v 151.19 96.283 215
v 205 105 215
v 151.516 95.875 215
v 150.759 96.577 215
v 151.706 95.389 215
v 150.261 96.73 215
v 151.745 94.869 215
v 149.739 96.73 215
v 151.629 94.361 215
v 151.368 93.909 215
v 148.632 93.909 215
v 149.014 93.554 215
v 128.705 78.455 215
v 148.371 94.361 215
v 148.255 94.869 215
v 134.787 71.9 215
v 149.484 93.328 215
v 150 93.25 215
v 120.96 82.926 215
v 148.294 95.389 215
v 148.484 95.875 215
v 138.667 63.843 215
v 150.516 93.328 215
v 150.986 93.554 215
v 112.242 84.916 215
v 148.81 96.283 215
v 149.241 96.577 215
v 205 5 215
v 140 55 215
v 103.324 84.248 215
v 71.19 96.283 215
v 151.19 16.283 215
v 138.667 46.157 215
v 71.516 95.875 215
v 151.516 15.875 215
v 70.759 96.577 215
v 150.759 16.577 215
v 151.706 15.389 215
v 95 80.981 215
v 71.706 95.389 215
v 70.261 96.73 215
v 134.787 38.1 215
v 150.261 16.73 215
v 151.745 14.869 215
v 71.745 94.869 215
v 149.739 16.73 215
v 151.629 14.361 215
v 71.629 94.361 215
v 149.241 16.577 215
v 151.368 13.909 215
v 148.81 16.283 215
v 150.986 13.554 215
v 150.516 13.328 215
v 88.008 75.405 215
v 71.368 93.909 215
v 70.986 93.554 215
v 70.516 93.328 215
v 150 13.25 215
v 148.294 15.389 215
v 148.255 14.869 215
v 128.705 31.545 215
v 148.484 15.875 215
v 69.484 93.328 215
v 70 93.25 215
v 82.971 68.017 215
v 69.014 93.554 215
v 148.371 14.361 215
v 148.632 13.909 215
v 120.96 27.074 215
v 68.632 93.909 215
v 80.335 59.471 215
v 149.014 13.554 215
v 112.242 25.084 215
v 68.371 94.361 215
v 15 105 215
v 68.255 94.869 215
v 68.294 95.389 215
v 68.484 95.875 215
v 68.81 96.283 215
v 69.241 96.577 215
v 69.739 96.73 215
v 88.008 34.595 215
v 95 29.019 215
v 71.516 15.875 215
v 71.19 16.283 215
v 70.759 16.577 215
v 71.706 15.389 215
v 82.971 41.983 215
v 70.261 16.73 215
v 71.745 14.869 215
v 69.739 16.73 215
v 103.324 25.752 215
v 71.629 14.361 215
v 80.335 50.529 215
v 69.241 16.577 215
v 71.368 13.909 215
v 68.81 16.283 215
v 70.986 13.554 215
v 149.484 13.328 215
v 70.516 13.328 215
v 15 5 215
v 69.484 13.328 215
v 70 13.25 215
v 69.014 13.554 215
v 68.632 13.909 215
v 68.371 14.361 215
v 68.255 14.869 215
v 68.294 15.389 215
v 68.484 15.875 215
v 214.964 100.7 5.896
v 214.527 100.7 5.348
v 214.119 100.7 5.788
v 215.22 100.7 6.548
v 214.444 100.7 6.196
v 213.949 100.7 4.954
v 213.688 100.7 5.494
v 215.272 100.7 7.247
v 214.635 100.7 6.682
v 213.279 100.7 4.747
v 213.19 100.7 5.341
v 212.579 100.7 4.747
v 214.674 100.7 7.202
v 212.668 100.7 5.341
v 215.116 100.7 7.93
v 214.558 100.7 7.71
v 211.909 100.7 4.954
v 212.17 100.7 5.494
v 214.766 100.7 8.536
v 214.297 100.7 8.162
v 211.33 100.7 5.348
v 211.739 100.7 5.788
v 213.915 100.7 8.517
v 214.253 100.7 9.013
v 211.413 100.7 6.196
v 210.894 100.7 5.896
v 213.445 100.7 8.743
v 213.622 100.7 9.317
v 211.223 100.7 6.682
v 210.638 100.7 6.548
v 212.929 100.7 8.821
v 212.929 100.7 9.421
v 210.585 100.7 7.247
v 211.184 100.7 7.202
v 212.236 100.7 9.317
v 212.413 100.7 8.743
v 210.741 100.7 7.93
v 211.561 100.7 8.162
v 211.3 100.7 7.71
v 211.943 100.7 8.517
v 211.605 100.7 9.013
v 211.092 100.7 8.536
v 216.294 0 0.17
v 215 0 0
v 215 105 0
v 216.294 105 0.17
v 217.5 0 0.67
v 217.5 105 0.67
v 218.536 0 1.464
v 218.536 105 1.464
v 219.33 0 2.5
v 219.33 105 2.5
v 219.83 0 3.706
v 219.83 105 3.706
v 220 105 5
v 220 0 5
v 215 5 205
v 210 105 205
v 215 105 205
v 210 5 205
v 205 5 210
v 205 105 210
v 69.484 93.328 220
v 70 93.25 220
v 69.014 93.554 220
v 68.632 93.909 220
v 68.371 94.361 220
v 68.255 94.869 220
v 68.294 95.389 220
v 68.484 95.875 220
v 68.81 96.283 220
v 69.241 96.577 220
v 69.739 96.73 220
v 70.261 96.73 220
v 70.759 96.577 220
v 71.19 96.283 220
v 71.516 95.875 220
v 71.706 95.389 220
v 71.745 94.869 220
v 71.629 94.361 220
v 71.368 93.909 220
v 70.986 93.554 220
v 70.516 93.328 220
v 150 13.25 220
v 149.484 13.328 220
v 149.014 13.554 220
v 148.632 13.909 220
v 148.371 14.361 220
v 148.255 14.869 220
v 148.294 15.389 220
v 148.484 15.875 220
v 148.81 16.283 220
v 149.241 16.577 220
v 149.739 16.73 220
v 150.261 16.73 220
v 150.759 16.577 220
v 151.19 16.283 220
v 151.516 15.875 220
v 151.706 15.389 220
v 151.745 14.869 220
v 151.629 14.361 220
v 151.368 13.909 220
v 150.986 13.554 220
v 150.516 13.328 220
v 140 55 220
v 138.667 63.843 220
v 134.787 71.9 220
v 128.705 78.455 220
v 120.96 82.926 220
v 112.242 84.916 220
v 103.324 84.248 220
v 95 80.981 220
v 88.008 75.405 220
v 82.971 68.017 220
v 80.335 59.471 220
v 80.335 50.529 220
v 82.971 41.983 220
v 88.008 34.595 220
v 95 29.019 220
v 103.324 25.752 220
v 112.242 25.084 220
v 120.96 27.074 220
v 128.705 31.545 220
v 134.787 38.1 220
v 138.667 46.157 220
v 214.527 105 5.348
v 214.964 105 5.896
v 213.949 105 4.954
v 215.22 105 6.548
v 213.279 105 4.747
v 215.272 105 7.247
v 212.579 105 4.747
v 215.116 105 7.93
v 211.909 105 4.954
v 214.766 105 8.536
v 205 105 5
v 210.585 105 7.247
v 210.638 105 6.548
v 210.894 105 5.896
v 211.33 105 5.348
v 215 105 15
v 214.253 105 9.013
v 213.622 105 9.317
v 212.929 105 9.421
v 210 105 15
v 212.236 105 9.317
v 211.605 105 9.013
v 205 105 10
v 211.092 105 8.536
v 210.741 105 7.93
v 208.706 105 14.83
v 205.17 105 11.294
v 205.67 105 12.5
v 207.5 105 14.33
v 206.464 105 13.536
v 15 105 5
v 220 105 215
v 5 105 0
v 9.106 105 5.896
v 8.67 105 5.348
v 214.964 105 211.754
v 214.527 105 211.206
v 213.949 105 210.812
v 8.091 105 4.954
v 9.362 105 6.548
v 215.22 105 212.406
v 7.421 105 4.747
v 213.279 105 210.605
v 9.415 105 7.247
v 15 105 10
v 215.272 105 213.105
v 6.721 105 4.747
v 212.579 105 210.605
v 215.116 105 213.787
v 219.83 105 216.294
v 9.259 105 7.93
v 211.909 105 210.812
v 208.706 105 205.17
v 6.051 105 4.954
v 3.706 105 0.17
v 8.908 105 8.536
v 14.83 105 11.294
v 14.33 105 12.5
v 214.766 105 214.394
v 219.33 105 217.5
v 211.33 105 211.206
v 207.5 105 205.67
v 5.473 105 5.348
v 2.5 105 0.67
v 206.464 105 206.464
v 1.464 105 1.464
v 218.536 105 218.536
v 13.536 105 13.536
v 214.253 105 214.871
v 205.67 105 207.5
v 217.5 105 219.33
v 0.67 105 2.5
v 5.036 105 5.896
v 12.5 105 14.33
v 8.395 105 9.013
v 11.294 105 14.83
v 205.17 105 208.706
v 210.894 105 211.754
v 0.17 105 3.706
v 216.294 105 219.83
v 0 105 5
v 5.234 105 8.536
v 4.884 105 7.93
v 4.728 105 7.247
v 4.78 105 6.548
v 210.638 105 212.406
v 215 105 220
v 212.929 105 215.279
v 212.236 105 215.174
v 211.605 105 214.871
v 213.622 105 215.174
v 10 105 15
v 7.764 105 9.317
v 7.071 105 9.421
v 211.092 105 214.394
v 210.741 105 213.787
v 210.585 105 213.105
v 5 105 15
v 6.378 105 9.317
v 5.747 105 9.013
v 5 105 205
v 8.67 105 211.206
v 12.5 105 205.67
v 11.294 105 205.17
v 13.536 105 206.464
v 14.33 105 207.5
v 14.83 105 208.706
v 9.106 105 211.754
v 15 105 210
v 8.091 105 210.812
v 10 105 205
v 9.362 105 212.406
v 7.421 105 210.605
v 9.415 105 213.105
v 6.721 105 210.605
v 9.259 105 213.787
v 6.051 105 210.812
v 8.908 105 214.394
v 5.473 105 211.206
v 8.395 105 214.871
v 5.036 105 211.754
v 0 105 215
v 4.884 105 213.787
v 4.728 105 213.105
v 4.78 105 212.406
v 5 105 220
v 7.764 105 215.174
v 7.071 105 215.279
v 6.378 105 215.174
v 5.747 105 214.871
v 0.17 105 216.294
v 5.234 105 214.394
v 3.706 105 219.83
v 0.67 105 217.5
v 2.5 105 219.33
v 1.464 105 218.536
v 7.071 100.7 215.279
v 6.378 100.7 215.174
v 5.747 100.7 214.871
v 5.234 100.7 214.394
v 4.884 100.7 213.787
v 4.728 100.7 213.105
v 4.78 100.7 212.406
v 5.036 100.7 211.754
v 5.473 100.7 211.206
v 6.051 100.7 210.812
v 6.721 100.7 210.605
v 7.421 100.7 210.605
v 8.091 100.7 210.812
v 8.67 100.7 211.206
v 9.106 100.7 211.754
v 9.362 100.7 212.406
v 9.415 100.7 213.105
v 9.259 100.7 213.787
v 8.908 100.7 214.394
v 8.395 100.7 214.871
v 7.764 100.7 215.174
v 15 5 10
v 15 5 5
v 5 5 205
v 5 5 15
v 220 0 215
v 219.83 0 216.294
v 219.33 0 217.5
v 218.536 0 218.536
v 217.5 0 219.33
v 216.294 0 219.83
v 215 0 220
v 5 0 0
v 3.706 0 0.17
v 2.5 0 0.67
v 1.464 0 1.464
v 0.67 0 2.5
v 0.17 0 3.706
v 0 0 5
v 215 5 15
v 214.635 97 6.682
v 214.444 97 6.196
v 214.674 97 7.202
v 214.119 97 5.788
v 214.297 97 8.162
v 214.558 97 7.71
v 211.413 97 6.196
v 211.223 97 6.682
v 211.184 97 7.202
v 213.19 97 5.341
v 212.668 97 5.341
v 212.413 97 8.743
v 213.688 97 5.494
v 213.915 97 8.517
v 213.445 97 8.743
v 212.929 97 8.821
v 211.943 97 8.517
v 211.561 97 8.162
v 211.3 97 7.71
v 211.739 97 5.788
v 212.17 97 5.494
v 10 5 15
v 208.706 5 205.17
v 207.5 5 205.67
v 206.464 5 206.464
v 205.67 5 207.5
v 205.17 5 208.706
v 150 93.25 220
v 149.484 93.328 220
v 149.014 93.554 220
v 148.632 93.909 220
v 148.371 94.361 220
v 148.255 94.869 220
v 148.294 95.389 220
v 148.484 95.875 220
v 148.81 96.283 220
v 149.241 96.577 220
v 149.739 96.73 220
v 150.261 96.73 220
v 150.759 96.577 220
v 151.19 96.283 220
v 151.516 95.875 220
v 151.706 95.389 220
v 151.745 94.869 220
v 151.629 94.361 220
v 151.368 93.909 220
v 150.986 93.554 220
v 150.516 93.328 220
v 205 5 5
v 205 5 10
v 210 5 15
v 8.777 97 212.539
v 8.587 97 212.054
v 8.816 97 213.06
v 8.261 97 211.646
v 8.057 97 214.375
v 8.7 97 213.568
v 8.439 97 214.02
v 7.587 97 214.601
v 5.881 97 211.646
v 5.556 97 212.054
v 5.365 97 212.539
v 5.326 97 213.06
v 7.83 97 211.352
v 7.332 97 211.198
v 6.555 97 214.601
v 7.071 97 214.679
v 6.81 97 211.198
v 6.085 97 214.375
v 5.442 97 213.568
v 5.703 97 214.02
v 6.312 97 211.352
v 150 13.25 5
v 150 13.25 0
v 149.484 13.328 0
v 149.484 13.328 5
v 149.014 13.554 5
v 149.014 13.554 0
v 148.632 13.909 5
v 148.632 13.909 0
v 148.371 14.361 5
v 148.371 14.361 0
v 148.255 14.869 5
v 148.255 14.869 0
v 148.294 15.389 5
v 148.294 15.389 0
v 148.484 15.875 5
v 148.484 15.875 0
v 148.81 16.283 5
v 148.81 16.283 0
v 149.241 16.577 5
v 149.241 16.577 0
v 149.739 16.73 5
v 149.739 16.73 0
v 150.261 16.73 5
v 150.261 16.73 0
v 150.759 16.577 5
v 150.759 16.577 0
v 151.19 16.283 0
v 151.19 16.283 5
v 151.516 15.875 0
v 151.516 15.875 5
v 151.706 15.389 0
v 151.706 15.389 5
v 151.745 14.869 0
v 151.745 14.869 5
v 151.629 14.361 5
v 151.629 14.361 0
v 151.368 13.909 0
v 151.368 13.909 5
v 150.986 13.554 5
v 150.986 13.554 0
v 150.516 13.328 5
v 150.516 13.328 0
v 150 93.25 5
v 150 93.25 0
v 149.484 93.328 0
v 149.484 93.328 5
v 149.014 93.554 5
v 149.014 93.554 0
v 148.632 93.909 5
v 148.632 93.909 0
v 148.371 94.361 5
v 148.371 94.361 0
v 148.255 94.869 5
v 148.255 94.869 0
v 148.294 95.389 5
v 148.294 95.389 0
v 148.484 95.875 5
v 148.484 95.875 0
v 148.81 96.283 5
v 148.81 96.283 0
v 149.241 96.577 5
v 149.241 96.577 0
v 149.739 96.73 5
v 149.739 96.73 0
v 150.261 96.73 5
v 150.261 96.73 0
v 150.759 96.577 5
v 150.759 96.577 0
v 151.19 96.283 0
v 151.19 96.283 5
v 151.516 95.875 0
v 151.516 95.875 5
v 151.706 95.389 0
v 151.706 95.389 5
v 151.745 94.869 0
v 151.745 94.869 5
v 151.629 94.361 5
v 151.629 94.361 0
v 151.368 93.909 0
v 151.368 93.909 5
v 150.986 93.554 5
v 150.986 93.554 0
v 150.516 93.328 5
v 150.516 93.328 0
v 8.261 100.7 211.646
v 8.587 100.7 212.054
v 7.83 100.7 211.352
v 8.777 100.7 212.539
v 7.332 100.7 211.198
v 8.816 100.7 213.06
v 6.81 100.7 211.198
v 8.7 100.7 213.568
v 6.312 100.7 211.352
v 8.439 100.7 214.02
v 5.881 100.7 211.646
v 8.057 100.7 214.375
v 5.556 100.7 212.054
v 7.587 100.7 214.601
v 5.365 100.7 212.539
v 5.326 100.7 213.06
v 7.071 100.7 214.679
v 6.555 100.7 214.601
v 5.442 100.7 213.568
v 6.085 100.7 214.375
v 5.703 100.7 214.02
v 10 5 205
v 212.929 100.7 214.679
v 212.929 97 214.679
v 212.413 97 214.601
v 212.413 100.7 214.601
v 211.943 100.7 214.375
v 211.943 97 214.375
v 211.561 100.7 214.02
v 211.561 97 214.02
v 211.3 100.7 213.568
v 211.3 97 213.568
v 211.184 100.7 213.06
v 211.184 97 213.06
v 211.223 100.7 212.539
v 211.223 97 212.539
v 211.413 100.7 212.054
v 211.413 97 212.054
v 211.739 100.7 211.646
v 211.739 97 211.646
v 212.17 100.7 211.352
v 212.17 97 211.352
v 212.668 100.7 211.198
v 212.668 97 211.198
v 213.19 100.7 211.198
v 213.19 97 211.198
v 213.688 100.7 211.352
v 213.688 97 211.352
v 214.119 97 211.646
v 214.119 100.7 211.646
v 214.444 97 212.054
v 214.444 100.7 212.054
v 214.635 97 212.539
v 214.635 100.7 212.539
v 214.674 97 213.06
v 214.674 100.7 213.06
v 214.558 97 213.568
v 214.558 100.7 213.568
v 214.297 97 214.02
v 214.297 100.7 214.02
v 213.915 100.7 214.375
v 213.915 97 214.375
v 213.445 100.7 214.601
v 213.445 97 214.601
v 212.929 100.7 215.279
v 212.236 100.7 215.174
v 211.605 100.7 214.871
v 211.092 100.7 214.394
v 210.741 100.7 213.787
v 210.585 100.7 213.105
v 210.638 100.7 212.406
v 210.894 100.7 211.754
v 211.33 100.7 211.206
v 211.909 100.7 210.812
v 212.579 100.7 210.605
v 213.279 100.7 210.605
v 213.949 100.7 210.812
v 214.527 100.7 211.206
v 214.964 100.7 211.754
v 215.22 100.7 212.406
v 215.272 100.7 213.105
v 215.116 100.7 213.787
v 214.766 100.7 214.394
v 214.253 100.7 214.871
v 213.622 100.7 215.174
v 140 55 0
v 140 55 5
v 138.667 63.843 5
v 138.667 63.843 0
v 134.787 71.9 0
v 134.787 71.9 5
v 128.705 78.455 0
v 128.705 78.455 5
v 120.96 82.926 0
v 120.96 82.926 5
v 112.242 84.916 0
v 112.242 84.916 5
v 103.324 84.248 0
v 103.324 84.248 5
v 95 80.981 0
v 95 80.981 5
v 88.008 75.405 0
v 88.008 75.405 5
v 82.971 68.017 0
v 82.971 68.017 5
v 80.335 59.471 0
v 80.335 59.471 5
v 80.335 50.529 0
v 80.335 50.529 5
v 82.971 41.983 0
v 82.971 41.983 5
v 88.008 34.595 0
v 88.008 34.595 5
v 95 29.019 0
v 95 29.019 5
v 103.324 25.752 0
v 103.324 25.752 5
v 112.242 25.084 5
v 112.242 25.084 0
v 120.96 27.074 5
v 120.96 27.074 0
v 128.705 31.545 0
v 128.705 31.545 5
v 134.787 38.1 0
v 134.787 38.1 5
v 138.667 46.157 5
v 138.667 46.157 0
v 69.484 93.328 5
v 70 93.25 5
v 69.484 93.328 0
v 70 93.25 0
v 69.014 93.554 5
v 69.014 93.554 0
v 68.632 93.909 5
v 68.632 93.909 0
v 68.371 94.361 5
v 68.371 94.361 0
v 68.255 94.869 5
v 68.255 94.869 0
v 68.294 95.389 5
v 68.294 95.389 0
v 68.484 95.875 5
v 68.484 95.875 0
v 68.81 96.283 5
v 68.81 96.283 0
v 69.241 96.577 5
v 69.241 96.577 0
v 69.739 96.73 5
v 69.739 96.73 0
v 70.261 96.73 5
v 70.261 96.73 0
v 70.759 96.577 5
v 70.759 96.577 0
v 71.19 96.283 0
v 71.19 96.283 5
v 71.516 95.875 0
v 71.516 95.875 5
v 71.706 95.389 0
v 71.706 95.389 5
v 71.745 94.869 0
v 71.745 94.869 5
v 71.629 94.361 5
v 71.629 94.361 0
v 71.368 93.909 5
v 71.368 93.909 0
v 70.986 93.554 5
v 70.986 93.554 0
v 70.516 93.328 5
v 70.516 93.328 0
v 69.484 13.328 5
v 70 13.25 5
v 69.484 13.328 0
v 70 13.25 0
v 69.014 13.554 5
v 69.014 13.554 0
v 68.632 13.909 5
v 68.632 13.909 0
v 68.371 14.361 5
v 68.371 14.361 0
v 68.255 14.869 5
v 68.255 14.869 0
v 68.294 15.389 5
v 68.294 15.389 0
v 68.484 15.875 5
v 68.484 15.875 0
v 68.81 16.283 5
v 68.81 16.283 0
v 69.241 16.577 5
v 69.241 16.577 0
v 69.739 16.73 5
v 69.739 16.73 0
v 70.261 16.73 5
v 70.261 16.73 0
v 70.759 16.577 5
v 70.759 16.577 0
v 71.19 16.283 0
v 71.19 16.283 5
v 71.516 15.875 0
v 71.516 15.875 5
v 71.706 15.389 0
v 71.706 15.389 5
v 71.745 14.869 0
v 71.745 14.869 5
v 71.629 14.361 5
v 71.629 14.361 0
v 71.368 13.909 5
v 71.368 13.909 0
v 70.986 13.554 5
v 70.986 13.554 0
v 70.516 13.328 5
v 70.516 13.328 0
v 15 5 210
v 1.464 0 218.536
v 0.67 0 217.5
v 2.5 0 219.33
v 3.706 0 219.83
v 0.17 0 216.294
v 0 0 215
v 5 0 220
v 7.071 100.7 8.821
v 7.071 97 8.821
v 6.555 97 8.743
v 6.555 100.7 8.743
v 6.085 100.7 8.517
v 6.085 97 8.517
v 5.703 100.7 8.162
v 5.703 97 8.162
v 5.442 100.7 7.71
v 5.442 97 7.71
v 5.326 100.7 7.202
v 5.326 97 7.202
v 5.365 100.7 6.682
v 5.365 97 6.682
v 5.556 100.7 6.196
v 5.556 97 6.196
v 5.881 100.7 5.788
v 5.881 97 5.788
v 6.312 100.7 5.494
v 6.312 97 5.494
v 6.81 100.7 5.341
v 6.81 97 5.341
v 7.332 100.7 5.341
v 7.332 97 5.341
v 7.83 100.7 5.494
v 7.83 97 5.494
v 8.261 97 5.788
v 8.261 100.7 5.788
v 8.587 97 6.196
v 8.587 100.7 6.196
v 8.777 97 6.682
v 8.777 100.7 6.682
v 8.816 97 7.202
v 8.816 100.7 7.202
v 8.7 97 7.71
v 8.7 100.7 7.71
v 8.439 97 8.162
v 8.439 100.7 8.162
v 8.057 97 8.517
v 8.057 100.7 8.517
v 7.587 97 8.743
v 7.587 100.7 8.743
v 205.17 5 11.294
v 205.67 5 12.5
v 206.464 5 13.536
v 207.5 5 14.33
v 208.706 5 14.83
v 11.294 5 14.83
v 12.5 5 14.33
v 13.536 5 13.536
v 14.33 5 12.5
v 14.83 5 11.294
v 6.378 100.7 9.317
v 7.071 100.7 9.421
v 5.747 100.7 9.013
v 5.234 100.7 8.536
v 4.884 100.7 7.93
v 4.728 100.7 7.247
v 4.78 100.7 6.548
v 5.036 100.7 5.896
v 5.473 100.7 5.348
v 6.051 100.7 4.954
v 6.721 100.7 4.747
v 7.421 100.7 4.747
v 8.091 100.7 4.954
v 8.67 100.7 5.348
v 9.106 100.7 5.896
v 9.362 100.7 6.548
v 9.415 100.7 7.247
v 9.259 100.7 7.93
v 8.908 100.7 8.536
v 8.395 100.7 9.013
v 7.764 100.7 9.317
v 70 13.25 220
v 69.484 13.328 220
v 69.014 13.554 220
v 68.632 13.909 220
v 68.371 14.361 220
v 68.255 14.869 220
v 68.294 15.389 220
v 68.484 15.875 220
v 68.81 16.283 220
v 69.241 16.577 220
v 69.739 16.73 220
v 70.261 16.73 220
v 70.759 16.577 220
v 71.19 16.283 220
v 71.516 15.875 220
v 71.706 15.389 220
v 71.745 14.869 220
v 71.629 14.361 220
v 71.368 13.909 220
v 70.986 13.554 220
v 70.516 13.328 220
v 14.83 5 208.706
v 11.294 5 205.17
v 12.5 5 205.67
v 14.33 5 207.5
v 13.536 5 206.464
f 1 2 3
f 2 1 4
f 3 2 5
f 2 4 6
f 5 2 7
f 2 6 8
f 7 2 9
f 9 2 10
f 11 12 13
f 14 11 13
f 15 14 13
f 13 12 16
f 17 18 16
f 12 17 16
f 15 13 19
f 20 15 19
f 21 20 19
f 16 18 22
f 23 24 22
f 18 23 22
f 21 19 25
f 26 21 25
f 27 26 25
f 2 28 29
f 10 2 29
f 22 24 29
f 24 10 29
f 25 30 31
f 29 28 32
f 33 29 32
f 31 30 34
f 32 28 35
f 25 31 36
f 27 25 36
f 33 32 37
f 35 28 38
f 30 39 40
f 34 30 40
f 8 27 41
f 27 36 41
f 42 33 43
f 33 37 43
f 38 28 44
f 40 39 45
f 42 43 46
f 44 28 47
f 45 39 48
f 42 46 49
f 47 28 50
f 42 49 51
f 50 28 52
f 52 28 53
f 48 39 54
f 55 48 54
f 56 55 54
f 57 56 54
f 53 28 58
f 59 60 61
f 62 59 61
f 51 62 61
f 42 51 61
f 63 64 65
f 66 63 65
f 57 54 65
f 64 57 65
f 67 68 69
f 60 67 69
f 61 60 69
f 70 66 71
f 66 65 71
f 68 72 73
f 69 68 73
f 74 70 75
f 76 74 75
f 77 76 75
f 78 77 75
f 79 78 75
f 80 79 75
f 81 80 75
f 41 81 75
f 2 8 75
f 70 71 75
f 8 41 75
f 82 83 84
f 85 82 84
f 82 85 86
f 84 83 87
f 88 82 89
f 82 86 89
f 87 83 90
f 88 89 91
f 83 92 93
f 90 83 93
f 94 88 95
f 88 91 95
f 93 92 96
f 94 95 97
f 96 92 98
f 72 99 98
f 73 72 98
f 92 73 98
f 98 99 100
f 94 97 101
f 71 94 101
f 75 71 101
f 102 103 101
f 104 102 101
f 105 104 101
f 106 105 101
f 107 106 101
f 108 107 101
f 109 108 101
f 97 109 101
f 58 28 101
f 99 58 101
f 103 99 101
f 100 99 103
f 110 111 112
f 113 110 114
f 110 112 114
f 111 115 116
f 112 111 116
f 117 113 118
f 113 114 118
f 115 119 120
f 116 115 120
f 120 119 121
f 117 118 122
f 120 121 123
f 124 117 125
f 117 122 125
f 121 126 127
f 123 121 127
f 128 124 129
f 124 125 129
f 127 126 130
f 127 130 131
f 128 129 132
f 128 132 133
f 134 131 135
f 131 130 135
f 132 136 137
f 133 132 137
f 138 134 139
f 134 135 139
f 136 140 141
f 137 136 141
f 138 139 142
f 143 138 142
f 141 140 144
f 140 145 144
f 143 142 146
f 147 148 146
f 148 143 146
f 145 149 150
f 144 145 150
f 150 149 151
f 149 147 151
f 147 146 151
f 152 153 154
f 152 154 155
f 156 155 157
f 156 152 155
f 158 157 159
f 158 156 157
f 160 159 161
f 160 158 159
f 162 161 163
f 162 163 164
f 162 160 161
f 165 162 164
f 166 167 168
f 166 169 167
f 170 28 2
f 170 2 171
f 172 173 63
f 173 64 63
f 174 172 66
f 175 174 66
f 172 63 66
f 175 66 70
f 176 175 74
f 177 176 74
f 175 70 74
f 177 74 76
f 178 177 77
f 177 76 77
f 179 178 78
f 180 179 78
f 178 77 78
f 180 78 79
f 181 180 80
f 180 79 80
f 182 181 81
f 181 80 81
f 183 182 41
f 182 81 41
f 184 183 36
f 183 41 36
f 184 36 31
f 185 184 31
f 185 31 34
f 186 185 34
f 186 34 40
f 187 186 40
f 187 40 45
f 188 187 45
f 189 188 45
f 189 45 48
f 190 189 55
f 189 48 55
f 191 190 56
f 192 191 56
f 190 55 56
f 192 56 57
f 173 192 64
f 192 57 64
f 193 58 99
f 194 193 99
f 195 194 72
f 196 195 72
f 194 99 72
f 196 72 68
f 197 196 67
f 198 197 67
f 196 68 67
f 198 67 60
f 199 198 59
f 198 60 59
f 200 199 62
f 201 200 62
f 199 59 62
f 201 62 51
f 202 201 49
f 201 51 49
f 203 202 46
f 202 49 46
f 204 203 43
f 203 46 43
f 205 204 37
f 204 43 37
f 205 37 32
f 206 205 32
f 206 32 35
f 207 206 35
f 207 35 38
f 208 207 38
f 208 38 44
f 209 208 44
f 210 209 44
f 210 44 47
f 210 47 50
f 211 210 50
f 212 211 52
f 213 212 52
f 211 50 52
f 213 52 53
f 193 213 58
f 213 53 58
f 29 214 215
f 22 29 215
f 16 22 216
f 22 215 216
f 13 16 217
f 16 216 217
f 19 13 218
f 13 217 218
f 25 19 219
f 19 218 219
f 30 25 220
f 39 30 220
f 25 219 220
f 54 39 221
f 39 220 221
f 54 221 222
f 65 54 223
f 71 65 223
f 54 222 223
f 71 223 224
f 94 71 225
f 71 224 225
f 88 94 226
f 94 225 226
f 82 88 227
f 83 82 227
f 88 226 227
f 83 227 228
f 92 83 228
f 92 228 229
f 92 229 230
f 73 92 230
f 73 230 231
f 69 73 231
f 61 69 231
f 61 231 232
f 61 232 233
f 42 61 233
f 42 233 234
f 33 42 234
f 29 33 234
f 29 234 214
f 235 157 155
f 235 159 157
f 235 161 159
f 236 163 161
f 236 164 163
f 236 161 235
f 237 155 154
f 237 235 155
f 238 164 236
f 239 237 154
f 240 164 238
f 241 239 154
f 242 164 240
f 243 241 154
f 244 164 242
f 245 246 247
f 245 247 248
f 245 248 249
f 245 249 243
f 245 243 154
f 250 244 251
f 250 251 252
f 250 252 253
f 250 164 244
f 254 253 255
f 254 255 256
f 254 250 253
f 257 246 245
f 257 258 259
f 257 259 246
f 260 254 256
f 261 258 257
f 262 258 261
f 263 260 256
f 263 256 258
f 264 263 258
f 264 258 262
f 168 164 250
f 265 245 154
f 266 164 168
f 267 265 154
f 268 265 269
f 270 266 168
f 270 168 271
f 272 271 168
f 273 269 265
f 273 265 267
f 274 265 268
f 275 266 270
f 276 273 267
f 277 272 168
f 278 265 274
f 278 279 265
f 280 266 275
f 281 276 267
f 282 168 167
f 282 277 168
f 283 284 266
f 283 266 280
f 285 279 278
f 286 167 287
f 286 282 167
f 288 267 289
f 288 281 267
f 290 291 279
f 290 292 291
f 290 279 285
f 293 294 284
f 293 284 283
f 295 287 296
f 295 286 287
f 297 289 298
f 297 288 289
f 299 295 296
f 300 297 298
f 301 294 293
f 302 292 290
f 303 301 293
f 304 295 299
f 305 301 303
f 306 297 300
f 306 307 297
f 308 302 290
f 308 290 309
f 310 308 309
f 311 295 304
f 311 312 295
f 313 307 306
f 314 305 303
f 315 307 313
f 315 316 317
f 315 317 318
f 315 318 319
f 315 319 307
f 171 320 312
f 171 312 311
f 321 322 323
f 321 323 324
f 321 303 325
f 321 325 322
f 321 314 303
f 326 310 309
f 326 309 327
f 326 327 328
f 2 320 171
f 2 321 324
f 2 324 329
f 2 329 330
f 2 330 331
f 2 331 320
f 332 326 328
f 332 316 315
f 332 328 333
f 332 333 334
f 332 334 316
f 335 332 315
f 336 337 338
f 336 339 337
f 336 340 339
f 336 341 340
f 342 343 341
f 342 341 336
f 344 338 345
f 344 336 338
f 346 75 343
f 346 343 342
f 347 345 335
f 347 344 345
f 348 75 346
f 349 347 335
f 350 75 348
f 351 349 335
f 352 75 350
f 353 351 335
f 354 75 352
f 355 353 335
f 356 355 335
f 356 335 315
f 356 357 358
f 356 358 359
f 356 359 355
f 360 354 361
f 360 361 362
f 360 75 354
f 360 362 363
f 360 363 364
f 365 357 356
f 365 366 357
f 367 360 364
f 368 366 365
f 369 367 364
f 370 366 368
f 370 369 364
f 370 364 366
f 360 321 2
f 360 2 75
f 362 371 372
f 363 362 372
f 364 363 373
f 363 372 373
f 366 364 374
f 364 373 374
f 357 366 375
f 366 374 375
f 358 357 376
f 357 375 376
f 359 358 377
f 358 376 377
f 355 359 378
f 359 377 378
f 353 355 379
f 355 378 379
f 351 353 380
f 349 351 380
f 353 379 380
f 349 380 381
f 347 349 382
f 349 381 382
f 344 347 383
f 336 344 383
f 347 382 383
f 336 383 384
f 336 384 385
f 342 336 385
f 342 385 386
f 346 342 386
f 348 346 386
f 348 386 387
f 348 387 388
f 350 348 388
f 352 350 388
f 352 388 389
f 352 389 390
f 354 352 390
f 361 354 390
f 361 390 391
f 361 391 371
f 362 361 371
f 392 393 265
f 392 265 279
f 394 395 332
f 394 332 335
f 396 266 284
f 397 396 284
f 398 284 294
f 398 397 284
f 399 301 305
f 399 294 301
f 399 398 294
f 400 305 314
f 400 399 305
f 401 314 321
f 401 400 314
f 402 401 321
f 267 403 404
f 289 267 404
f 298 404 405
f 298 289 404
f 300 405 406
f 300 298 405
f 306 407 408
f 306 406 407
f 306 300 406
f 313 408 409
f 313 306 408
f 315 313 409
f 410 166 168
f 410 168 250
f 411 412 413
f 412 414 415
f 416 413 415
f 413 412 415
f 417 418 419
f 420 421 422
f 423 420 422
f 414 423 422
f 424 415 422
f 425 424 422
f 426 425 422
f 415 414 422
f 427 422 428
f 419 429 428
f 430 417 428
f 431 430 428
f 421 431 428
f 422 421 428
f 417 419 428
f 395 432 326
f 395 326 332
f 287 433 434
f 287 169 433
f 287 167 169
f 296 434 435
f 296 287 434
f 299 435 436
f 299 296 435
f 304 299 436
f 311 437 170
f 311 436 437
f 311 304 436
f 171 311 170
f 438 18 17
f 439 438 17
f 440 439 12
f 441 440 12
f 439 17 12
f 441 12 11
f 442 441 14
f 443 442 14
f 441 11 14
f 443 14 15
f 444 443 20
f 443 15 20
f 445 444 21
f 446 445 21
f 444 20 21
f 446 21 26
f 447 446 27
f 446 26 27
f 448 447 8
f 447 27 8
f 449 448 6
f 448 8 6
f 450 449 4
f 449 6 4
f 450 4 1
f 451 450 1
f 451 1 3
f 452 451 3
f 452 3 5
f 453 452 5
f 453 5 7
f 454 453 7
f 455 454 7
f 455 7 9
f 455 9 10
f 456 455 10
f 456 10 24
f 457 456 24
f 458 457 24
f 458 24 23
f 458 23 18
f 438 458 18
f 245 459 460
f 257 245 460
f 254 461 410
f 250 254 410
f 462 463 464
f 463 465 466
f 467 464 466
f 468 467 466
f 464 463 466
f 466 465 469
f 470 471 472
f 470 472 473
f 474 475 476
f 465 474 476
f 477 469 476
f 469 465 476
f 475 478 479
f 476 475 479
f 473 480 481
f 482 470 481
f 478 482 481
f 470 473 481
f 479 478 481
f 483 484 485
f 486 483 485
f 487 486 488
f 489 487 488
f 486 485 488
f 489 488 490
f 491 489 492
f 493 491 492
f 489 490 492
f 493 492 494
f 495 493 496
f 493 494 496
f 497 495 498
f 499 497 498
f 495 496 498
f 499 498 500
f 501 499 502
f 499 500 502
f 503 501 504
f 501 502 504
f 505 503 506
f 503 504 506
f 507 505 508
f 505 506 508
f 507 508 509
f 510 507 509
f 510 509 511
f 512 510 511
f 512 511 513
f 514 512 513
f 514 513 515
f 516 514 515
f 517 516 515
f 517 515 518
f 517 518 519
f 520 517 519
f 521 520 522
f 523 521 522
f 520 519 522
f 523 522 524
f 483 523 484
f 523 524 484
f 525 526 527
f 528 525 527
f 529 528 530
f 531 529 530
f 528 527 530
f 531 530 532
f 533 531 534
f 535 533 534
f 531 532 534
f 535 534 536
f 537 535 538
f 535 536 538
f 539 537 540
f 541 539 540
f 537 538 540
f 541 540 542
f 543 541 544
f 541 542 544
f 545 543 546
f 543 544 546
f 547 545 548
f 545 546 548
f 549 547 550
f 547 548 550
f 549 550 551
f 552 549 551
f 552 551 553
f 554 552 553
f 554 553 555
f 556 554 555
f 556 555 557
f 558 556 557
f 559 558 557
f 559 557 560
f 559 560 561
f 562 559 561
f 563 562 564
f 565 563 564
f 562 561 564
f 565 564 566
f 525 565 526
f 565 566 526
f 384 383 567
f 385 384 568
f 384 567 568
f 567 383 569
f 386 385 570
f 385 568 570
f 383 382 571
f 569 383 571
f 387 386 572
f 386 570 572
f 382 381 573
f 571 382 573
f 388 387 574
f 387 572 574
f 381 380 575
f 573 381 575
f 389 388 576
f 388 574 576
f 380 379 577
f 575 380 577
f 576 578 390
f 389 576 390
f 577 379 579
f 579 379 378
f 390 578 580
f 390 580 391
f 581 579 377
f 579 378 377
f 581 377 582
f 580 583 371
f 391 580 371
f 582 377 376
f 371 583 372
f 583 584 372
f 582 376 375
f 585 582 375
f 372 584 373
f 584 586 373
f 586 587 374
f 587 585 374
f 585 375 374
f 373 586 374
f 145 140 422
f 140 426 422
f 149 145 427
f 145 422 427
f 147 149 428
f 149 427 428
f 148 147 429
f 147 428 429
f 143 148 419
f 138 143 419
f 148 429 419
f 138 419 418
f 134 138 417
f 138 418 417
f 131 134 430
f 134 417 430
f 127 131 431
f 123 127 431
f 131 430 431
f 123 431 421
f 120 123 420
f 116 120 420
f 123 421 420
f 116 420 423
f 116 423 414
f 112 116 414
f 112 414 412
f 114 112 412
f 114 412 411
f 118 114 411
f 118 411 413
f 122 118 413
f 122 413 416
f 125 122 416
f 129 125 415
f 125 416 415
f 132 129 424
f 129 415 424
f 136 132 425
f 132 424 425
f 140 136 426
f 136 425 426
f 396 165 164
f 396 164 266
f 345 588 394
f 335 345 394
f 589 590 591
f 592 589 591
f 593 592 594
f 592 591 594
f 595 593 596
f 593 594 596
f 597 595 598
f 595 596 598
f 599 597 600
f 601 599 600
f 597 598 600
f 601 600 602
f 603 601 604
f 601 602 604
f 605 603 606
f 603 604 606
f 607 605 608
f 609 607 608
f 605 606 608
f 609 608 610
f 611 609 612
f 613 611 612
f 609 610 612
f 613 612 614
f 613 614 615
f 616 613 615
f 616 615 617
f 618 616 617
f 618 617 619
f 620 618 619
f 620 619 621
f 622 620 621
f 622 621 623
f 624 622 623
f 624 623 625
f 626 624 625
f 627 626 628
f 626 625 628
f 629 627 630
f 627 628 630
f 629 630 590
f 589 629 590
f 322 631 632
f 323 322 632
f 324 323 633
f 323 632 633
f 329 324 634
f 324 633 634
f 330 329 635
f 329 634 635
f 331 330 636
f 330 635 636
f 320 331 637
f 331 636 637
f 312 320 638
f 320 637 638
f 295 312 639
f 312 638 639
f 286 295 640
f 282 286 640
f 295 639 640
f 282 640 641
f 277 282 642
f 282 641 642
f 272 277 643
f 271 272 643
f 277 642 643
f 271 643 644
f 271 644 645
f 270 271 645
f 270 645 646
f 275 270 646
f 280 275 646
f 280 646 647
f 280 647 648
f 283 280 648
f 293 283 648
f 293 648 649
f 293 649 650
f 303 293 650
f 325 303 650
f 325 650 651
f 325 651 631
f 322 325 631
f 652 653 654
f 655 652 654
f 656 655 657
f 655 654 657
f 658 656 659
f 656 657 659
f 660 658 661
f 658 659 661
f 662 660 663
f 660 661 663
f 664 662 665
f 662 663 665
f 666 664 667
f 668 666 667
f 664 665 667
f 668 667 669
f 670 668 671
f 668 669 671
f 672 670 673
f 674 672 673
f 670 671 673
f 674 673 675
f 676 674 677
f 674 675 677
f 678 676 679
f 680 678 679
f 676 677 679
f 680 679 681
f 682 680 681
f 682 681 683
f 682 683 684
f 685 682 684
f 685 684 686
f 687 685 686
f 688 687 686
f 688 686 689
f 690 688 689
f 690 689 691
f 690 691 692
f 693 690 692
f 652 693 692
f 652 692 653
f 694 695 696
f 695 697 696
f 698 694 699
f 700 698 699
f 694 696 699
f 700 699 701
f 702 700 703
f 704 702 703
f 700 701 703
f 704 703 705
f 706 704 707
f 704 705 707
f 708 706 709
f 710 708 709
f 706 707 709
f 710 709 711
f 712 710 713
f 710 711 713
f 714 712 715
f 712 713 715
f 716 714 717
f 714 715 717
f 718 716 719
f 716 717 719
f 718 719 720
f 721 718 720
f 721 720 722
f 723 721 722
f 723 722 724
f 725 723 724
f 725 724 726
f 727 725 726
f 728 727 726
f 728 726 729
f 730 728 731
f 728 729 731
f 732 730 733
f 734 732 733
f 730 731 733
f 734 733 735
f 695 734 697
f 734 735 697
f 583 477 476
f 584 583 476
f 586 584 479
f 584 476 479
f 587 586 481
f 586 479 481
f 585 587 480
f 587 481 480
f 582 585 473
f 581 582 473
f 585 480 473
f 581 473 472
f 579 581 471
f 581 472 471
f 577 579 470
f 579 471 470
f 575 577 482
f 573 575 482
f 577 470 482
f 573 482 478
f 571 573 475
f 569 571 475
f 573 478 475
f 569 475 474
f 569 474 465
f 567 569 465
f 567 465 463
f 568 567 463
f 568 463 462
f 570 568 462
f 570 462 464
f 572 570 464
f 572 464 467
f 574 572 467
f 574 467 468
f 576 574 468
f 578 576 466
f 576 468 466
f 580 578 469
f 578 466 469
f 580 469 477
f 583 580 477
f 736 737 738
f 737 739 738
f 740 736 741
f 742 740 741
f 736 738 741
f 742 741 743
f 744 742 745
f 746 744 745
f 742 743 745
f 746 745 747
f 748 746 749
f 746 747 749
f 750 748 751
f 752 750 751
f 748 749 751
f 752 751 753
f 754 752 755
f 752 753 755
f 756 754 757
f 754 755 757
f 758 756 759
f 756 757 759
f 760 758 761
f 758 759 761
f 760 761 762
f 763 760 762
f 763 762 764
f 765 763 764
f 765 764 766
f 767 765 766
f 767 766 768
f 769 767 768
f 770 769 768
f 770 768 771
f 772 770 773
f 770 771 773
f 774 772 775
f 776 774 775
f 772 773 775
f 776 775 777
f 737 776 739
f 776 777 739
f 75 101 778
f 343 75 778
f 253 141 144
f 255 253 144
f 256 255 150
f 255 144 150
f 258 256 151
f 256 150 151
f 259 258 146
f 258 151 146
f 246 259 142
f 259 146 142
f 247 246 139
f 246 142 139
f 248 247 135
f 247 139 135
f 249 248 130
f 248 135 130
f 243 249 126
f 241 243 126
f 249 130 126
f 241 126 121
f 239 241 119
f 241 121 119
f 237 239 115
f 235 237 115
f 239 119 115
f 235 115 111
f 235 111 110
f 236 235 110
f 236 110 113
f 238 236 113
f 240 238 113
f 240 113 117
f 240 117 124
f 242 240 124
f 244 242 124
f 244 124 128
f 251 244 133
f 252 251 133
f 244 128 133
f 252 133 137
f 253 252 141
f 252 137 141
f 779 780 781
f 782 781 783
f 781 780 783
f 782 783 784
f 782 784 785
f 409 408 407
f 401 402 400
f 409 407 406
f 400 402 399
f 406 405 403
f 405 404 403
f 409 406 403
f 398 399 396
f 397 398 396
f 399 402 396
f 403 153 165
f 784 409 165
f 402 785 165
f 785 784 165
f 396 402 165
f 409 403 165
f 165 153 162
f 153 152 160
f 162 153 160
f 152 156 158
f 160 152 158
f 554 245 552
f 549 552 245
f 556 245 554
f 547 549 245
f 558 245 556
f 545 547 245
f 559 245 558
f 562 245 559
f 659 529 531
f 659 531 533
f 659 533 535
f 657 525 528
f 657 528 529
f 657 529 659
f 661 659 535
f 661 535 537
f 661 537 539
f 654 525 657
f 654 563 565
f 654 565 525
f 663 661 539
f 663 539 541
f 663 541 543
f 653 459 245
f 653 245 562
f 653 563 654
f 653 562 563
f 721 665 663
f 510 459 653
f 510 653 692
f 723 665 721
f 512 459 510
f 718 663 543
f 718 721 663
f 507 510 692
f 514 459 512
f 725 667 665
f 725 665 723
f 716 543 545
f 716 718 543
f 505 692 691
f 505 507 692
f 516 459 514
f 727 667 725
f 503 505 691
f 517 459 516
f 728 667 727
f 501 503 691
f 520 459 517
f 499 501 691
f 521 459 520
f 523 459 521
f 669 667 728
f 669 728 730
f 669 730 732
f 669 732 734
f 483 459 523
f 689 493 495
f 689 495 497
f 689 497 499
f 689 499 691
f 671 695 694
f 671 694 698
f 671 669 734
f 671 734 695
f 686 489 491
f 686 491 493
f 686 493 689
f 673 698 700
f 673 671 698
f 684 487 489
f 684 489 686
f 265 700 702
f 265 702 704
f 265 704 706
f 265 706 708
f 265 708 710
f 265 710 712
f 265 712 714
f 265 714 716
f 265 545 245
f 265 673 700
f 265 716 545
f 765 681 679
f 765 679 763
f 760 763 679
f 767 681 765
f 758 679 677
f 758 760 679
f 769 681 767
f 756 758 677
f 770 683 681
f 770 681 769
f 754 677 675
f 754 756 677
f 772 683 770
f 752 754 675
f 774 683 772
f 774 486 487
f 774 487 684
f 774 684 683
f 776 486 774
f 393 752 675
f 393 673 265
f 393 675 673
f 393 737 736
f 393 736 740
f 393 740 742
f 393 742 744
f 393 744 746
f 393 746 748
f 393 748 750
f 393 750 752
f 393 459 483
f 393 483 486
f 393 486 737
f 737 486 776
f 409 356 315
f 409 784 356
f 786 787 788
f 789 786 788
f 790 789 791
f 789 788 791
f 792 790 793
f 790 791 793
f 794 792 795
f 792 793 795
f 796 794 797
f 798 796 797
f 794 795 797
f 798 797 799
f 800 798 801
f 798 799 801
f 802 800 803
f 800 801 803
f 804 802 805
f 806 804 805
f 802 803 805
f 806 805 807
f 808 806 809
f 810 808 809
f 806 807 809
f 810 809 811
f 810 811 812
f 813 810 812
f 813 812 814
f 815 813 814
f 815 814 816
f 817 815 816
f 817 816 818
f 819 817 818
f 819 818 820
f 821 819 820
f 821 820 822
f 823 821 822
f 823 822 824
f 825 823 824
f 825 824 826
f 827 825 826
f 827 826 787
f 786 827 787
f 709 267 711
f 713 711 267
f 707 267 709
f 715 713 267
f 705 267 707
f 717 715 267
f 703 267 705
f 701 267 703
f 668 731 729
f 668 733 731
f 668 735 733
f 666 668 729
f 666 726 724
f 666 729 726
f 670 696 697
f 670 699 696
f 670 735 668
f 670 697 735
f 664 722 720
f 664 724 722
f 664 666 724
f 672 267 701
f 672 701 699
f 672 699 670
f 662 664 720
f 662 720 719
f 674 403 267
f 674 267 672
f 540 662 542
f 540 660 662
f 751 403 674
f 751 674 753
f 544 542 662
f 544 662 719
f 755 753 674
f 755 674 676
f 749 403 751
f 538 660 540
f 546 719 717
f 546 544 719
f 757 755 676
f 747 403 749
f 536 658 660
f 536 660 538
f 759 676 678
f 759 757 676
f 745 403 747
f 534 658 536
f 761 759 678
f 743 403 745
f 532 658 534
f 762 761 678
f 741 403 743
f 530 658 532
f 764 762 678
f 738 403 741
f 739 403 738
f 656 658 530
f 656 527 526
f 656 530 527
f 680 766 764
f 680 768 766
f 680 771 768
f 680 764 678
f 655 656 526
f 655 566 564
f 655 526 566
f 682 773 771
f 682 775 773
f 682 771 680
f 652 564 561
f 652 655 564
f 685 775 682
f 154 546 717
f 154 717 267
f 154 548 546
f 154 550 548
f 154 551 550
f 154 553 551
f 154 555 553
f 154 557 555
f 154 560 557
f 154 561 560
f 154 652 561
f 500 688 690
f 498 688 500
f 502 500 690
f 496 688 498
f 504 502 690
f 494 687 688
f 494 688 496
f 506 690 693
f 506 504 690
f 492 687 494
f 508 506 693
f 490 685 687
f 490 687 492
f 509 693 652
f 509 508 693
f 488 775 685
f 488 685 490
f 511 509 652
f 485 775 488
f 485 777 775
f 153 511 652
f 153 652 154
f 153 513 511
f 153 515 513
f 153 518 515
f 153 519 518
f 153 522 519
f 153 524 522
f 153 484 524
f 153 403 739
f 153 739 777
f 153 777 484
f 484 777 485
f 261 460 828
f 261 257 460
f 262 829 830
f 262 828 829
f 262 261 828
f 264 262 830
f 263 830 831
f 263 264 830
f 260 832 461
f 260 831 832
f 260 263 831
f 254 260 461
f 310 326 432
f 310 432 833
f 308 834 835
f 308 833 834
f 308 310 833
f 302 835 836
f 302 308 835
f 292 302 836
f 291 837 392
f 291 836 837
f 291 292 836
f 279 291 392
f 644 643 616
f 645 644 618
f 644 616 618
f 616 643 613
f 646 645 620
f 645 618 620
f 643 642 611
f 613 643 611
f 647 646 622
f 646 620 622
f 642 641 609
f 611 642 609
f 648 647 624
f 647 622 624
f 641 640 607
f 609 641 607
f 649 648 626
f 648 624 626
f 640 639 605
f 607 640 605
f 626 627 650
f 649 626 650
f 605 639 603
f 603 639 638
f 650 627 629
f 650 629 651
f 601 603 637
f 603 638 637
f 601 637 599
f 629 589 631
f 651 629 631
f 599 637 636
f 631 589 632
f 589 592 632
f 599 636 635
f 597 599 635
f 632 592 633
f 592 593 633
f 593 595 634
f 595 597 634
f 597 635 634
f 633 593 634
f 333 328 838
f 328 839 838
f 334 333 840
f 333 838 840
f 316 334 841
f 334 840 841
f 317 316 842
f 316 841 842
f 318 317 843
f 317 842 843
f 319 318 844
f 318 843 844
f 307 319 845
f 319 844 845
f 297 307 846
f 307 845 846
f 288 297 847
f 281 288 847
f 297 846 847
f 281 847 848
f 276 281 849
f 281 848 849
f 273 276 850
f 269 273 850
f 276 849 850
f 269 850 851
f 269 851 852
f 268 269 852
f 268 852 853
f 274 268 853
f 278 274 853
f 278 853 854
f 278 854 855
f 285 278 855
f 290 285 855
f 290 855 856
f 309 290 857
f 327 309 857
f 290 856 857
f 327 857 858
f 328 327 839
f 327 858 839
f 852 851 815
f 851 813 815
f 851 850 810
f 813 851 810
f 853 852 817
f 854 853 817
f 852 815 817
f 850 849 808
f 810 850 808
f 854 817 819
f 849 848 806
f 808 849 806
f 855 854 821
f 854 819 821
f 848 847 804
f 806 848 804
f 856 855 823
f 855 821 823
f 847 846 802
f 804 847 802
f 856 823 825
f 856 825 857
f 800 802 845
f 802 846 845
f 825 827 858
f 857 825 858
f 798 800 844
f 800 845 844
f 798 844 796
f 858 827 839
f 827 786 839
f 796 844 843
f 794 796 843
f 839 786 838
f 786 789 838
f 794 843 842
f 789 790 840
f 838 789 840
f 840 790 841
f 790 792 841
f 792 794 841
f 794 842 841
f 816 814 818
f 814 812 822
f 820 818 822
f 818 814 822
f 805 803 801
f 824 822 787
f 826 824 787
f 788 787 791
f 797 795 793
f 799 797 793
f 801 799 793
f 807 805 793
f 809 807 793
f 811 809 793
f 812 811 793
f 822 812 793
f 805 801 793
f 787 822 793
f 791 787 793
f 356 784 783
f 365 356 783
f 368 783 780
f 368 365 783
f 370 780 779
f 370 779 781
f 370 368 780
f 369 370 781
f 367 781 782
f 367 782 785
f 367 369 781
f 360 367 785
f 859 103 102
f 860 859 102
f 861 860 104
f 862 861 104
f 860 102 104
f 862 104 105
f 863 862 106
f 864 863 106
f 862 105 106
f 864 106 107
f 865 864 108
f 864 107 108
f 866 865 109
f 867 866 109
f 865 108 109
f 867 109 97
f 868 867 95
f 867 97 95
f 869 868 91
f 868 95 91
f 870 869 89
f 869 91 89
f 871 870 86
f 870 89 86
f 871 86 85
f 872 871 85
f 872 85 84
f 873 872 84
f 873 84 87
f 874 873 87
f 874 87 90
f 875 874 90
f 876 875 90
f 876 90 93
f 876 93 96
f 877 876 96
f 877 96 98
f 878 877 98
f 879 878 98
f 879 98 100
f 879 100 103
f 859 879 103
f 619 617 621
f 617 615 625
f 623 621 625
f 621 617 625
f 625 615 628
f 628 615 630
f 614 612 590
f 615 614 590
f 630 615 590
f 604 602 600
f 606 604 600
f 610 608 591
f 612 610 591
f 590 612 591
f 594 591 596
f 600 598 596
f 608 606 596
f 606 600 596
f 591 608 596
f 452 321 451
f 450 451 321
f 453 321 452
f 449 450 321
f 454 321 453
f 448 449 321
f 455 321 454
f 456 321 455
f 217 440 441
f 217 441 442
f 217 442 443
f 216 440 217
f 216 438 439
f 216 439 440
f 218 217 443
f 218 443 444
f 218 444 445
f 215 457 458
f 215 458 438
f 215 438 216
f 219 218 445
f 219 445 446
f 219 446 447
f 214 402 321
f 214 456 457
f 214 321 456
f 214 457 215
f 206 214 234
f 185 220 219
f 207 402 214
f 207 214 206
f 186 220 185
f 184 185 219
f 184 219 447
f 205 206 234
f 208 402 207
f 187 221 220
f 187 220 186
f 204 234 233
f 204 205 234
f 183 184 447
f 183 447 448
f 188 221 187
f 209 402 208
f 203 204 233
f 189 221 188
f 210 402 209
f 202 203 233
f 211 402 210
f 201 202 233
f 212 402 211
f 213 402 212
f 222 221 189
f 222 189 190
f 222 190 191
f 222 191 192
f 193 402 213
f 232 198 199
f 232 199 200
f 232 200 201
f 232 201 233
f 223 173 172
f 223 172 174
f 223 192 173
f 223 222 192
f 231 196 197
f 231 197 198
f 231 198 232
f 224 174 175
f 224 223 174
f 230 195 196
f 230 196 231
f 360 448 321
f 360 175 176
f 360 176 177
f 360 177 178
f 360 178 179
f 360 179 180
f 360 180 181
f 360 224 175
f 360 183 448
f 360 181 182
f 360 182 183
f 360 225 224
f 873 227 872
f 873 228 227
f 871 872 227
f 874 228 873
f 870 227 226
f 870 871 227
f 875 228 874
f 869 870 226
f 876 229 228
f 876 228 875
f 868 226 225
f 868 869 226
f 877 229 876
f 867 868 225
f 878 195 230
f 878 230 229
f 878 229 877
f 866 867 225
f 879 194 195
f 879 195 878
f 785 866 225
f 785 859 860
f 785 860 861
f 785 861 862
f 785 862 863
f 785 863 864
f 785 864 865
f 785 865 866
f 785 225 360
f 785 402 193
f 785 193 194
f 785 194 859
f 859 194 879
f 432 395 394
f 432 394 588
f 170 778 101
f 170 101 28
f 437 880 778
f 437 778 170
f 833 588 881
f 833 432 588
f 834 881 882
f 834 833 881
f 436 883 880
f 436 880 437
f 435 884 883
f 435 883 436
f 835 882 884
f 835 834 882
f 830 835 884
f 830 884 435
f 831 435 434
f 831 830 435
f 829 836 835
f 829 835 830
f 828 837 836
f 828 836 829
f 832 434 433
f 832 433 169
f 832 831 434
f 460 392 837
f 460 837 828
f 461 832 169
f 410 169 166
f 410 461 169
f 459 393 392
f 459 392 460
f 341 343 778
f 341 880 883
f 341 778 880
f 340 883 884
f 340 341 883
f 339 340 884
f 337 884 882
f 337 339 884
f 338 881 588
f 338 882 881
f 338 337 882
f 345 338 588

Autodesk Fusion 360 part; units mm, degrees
sketch "Sketch1" plane through (0, 0, 0) normal (0, 1, 0) x (1, 0, 0)
  line L0 (0, 0) -> (220, 0)
  line L1 (220, 0) -> (220, -220)
  line L2 (220, -220) -> (0, -220)
  line L3 (0, -220) -> (0, 0)
  dimension "d1" = 220
  dimension "d2" = 220
extrude "Extrude1" add sketch "Sketch1" along normal blind 5
sketch "Sketch2" plane through (0, 5, 0) normal (0, 1, 0) x (-1, 0, 0)
  line L0 (0, 220) -> (-220, 220)
  line L1 (-220, 220) -> (-220, 0)
  line L2 (-220, 0) -> (0, 0)
  line L3 (0, 0) -> (0, 220)
  line L4 (0, 0) -> (-10, 0)
  line L5 (-10, 220) -> (0, 220)
  line L6 (0, 220) -> (0, 0)
  line L7 (0, 0) -> (-5, 0)
  line L8 (-5, 0) -> (-5, 220)
  line L9 (-5, 220) -> (0, 220)
  line L10 (0, 220) -> (0, 0)
  line L11 (0, 0) -> (-220, 0)
  line L12 (-220, 0) -> (-220, 5)
  line L13 (-220, 5) -> (0, 5)
  line L14 (0, 5) -> (0, 0)
  line L15 (0, 220) -> (-220, 220)
  line L16 (-220, 220) -> (-220, 215)
  line L17 (-220, 215) -> (0, 215)
  line L18 (0, 215) -> (0, 220)
  line L19 (-220, 220) -> (-215, 220)
  line L20 (-215, 220) -> (-215, 0)
  line L21 (-215, 0) -> (-220, 0)
  line L22 (-220, 0) -> (-220, 220)
  dimension "d5" = 5
  dimension "d6" = 5
extrude "Extrude2" add sketch "Sketch2" along normal blind 100 contours L0 L3 L5 L6 L8 L9 L10 L15 L17 L18 | L0 L5 L8 L15 L17 L20 | L3 L6 L8 L10 L13 L17 | L2 L3 L4 L6 L7 L8 L10 L11 L13 L14 | L0 L1 L15 L16 L17 L19 L20 L22 | L2 L4 L8 L11 L13 L20 | L1 L13 L17 L20 L22 | L1 L2 L11 L12 L13 L20 L21 L22
sketch "Sketch3" plane through (0, 0, 5) normal (0, 0, 1) x (1, 0, 0)
  line L0 (5, 5) -> (215, 5)
  line L1 (215, 5) -> (215, 105)
  line L2 (215, 105) -> (5, 105)
  line L3 (5, 105) -> (5, 5)
sketch "Sketch4" plane through (0, 5, 0) normal (0, 1, 0) x (-1, 0, 0)
  line L0 (-5, 5) -> (-5, 215)
  line L1 (-5, 215) -> (-215, 215)
  line L2 (-215, 215) -> (-215, 5)
  line L3 (-215, 5) -> (-5, 5)
  line L4 (-5, 5) -> (-15, 5)
  line L5 (-15, 5) -> (-15, 15)
  line L6 (-15, 15) -> (-5, 15)
  line L7 (-5, 15) -> (-5, 5)
  line L8 (-215, 5) -> (-205, 5)
  line L9 (-205, 5) -> (-205, 15)
  line L10 (-205, 15) -> (-215, 15)
  line L11 (-215, 15) -> (-215, 5)
  line L12 (-5, 215) -> (-15, 215)
  line L13 (-15, 215) -> (-15, 205)
  line L14 (-15, 205) -> (-5, 205)
  line L15 (-5, 205) -> (-5, 215)
  line L16 (-215, 215) -> (-205, 215)
  line L17 (-205, 215) -> (-205, 205)
  line L18 (-205, 205) -> (-215, 205)
  line L19 (-215, 205) -> (-215, 215)
  dimension "d10" = 10
  dimension "d11" = 10
  dimension "d12" = 10
  dimension "d13" = 10
  dimension "d14" = 10
  dimension "d15" = 10
  dimension "d16" = 10
  dimension "d17" = 10
extrude "Extrude3" add sketch "Sketch4" along normal blind 100 contours L0 L3 L4 L5 L6 L7 | L0 L1 L12 L13 L14 L15 | L2 L3 L8 L9 L10 L11 | L1 L2 L16 L17 L18 L19
fillet "Fillet1" radius 5 4 edges at (205, 55, 15) (15, 55, 15) (15, 55, 205) (205, 55, 205)
sketch "Sketch5" plane through (0, 0, 220) normal (0, 0, 1) x (1, 0, 0)
  line L0 (0, 0) -> (220, 0)
  line L1 (220, 0) -> (220, 105)
  line L2 (220, 105) -> (0, 105)
  line L3 (0, 105) -> (0, 0)
  line L4 (0, 0) -> (110, 0)
  line L5 (110, 0) -> (110, 55)
  line L6 (110, 55) -> (150, 55)
  line L7 (150, 55) -> (150, 15)
  line L8 (150, 15) -> (110, 15)
  line L9 (110, 15) -> (110, 55)
  line L10 (150, 15) -> (70, 15)
  line L11 (70, 15) -> (70, 95)
  line L12 (70, 95) -> (150, 95)
  line L13 (150, 95) -> (150, 15)
  circle A0 centre (110, 55) radius 30
  dimension "d22" = 55
  dimension "d23" = 40
  dimension "d24" = 40
  dimension "d25" = 80
  dimension "d26" = 80
  dimension "d27" = 60
extrude "Extrude4" cut sketch "Sketch5" against normal blind 270 contours L5 L6 L9 A0 | L5 L6 L9 A0
hole "Hole1" at (70, 95, 220) at (150, 95, 220) at (70, 15, 220) at (150, 15, 220) direction (0, 0, -1) diameter 3.5 depth 10000 tip angle 118
sketch "Sketch6" plane through (0, 105, 0) normal (0, 1, 0) x (-1, 0, 0)
  arc A0 (-210, 205) -> (-205, 210) centre (-210, 210) ccw
  line L0 (-205, 210) -> (-205, 215)
  line L1 (-205, 215) -> (-15, 215)
  line L2 (-15, 215) -> (-15, 210)
  arc A1 (-15, 210) -> (-10, 205) centre (-10, 210) ccw
  line L3 (-10, 205) -> (-5, 205)
  line L4 (-5, 205) -> (-5, 15)
  line L5 (-5, 15) -> (-10, 15)
  arc A2 (-10, 15) -> (-15, 10) centre (-10, 10) ccw
  line L6 (-15, 10) -> (-15, 5)
  line L7 (-15, 5) -> (-205, 5)
  line L8 (-205, 5) -> (-205, 10)
  arc A3 (-205, 10) -> (-210, 15) centre (-210, 10) ccw
  line L9 (-210, 15) -> (-215, 15)
  line L10 (-215, 15) -> (-215, 205)
  line L11 (-215, 205) -> (-210, 205)
  line L12 (0, 0) -> (0, 220)
  line L13 (0, 220) -> (-220, 220)
  line L14 (-220, 220) -> (-220, 0)
  line L15 (-220, 0) -> (0, 0)
  line L16 (0, 0) -> (-7.0711, 7.0711)
  line L17 (0, 0) -> (10, 0) construction
  line L18 (-220, 0) -> (-212.9289, 7.0711)
  line L19 (-220, 0) -> (-210, 0) construction
  line L20 (0, 220) -> (-7.0711, 212.9289)
  line L21 (0, 220) -> (10, 220) construction
  line L22 (-220, 220) -> (-212.9289, 212.9289)
  line L23 (-220, 220) -> (-210, 220) construction
  dimension "d33" = 135
  dimension "d34" = 10
  dimension "d35" = 45
  dimension "d36" = 10
  dimension "d37" = 135
  dimension "d38" = 10
  dimension "d39" = 10
  dimension "d40" = 45
hole "Hole2" at (7.0711, 105, 212.9289) at (212.9289, 105, 212.9289) at (212.9289, 105, 7.0711) at (7.0711, 105, 7.0711) direction (0, -1, 0) diameter 4.7 depth 4.3 tip angle 180
hole "Hole3" at (7.0711, 105, 212.9289) at (212.9289, 105, 212.9289) at (212.9289, 105, 7.0711) at (7.0711, 105, 7.0711) direction (0, -1, 0) diameter 3.5 depth 8 tip angle 180
fillet "Fillet2" radius 5 4 edges at (220, 52.5, 220) (0, 52.5, 220) (0, 52.5, 0) (220, 52.5, 0)
